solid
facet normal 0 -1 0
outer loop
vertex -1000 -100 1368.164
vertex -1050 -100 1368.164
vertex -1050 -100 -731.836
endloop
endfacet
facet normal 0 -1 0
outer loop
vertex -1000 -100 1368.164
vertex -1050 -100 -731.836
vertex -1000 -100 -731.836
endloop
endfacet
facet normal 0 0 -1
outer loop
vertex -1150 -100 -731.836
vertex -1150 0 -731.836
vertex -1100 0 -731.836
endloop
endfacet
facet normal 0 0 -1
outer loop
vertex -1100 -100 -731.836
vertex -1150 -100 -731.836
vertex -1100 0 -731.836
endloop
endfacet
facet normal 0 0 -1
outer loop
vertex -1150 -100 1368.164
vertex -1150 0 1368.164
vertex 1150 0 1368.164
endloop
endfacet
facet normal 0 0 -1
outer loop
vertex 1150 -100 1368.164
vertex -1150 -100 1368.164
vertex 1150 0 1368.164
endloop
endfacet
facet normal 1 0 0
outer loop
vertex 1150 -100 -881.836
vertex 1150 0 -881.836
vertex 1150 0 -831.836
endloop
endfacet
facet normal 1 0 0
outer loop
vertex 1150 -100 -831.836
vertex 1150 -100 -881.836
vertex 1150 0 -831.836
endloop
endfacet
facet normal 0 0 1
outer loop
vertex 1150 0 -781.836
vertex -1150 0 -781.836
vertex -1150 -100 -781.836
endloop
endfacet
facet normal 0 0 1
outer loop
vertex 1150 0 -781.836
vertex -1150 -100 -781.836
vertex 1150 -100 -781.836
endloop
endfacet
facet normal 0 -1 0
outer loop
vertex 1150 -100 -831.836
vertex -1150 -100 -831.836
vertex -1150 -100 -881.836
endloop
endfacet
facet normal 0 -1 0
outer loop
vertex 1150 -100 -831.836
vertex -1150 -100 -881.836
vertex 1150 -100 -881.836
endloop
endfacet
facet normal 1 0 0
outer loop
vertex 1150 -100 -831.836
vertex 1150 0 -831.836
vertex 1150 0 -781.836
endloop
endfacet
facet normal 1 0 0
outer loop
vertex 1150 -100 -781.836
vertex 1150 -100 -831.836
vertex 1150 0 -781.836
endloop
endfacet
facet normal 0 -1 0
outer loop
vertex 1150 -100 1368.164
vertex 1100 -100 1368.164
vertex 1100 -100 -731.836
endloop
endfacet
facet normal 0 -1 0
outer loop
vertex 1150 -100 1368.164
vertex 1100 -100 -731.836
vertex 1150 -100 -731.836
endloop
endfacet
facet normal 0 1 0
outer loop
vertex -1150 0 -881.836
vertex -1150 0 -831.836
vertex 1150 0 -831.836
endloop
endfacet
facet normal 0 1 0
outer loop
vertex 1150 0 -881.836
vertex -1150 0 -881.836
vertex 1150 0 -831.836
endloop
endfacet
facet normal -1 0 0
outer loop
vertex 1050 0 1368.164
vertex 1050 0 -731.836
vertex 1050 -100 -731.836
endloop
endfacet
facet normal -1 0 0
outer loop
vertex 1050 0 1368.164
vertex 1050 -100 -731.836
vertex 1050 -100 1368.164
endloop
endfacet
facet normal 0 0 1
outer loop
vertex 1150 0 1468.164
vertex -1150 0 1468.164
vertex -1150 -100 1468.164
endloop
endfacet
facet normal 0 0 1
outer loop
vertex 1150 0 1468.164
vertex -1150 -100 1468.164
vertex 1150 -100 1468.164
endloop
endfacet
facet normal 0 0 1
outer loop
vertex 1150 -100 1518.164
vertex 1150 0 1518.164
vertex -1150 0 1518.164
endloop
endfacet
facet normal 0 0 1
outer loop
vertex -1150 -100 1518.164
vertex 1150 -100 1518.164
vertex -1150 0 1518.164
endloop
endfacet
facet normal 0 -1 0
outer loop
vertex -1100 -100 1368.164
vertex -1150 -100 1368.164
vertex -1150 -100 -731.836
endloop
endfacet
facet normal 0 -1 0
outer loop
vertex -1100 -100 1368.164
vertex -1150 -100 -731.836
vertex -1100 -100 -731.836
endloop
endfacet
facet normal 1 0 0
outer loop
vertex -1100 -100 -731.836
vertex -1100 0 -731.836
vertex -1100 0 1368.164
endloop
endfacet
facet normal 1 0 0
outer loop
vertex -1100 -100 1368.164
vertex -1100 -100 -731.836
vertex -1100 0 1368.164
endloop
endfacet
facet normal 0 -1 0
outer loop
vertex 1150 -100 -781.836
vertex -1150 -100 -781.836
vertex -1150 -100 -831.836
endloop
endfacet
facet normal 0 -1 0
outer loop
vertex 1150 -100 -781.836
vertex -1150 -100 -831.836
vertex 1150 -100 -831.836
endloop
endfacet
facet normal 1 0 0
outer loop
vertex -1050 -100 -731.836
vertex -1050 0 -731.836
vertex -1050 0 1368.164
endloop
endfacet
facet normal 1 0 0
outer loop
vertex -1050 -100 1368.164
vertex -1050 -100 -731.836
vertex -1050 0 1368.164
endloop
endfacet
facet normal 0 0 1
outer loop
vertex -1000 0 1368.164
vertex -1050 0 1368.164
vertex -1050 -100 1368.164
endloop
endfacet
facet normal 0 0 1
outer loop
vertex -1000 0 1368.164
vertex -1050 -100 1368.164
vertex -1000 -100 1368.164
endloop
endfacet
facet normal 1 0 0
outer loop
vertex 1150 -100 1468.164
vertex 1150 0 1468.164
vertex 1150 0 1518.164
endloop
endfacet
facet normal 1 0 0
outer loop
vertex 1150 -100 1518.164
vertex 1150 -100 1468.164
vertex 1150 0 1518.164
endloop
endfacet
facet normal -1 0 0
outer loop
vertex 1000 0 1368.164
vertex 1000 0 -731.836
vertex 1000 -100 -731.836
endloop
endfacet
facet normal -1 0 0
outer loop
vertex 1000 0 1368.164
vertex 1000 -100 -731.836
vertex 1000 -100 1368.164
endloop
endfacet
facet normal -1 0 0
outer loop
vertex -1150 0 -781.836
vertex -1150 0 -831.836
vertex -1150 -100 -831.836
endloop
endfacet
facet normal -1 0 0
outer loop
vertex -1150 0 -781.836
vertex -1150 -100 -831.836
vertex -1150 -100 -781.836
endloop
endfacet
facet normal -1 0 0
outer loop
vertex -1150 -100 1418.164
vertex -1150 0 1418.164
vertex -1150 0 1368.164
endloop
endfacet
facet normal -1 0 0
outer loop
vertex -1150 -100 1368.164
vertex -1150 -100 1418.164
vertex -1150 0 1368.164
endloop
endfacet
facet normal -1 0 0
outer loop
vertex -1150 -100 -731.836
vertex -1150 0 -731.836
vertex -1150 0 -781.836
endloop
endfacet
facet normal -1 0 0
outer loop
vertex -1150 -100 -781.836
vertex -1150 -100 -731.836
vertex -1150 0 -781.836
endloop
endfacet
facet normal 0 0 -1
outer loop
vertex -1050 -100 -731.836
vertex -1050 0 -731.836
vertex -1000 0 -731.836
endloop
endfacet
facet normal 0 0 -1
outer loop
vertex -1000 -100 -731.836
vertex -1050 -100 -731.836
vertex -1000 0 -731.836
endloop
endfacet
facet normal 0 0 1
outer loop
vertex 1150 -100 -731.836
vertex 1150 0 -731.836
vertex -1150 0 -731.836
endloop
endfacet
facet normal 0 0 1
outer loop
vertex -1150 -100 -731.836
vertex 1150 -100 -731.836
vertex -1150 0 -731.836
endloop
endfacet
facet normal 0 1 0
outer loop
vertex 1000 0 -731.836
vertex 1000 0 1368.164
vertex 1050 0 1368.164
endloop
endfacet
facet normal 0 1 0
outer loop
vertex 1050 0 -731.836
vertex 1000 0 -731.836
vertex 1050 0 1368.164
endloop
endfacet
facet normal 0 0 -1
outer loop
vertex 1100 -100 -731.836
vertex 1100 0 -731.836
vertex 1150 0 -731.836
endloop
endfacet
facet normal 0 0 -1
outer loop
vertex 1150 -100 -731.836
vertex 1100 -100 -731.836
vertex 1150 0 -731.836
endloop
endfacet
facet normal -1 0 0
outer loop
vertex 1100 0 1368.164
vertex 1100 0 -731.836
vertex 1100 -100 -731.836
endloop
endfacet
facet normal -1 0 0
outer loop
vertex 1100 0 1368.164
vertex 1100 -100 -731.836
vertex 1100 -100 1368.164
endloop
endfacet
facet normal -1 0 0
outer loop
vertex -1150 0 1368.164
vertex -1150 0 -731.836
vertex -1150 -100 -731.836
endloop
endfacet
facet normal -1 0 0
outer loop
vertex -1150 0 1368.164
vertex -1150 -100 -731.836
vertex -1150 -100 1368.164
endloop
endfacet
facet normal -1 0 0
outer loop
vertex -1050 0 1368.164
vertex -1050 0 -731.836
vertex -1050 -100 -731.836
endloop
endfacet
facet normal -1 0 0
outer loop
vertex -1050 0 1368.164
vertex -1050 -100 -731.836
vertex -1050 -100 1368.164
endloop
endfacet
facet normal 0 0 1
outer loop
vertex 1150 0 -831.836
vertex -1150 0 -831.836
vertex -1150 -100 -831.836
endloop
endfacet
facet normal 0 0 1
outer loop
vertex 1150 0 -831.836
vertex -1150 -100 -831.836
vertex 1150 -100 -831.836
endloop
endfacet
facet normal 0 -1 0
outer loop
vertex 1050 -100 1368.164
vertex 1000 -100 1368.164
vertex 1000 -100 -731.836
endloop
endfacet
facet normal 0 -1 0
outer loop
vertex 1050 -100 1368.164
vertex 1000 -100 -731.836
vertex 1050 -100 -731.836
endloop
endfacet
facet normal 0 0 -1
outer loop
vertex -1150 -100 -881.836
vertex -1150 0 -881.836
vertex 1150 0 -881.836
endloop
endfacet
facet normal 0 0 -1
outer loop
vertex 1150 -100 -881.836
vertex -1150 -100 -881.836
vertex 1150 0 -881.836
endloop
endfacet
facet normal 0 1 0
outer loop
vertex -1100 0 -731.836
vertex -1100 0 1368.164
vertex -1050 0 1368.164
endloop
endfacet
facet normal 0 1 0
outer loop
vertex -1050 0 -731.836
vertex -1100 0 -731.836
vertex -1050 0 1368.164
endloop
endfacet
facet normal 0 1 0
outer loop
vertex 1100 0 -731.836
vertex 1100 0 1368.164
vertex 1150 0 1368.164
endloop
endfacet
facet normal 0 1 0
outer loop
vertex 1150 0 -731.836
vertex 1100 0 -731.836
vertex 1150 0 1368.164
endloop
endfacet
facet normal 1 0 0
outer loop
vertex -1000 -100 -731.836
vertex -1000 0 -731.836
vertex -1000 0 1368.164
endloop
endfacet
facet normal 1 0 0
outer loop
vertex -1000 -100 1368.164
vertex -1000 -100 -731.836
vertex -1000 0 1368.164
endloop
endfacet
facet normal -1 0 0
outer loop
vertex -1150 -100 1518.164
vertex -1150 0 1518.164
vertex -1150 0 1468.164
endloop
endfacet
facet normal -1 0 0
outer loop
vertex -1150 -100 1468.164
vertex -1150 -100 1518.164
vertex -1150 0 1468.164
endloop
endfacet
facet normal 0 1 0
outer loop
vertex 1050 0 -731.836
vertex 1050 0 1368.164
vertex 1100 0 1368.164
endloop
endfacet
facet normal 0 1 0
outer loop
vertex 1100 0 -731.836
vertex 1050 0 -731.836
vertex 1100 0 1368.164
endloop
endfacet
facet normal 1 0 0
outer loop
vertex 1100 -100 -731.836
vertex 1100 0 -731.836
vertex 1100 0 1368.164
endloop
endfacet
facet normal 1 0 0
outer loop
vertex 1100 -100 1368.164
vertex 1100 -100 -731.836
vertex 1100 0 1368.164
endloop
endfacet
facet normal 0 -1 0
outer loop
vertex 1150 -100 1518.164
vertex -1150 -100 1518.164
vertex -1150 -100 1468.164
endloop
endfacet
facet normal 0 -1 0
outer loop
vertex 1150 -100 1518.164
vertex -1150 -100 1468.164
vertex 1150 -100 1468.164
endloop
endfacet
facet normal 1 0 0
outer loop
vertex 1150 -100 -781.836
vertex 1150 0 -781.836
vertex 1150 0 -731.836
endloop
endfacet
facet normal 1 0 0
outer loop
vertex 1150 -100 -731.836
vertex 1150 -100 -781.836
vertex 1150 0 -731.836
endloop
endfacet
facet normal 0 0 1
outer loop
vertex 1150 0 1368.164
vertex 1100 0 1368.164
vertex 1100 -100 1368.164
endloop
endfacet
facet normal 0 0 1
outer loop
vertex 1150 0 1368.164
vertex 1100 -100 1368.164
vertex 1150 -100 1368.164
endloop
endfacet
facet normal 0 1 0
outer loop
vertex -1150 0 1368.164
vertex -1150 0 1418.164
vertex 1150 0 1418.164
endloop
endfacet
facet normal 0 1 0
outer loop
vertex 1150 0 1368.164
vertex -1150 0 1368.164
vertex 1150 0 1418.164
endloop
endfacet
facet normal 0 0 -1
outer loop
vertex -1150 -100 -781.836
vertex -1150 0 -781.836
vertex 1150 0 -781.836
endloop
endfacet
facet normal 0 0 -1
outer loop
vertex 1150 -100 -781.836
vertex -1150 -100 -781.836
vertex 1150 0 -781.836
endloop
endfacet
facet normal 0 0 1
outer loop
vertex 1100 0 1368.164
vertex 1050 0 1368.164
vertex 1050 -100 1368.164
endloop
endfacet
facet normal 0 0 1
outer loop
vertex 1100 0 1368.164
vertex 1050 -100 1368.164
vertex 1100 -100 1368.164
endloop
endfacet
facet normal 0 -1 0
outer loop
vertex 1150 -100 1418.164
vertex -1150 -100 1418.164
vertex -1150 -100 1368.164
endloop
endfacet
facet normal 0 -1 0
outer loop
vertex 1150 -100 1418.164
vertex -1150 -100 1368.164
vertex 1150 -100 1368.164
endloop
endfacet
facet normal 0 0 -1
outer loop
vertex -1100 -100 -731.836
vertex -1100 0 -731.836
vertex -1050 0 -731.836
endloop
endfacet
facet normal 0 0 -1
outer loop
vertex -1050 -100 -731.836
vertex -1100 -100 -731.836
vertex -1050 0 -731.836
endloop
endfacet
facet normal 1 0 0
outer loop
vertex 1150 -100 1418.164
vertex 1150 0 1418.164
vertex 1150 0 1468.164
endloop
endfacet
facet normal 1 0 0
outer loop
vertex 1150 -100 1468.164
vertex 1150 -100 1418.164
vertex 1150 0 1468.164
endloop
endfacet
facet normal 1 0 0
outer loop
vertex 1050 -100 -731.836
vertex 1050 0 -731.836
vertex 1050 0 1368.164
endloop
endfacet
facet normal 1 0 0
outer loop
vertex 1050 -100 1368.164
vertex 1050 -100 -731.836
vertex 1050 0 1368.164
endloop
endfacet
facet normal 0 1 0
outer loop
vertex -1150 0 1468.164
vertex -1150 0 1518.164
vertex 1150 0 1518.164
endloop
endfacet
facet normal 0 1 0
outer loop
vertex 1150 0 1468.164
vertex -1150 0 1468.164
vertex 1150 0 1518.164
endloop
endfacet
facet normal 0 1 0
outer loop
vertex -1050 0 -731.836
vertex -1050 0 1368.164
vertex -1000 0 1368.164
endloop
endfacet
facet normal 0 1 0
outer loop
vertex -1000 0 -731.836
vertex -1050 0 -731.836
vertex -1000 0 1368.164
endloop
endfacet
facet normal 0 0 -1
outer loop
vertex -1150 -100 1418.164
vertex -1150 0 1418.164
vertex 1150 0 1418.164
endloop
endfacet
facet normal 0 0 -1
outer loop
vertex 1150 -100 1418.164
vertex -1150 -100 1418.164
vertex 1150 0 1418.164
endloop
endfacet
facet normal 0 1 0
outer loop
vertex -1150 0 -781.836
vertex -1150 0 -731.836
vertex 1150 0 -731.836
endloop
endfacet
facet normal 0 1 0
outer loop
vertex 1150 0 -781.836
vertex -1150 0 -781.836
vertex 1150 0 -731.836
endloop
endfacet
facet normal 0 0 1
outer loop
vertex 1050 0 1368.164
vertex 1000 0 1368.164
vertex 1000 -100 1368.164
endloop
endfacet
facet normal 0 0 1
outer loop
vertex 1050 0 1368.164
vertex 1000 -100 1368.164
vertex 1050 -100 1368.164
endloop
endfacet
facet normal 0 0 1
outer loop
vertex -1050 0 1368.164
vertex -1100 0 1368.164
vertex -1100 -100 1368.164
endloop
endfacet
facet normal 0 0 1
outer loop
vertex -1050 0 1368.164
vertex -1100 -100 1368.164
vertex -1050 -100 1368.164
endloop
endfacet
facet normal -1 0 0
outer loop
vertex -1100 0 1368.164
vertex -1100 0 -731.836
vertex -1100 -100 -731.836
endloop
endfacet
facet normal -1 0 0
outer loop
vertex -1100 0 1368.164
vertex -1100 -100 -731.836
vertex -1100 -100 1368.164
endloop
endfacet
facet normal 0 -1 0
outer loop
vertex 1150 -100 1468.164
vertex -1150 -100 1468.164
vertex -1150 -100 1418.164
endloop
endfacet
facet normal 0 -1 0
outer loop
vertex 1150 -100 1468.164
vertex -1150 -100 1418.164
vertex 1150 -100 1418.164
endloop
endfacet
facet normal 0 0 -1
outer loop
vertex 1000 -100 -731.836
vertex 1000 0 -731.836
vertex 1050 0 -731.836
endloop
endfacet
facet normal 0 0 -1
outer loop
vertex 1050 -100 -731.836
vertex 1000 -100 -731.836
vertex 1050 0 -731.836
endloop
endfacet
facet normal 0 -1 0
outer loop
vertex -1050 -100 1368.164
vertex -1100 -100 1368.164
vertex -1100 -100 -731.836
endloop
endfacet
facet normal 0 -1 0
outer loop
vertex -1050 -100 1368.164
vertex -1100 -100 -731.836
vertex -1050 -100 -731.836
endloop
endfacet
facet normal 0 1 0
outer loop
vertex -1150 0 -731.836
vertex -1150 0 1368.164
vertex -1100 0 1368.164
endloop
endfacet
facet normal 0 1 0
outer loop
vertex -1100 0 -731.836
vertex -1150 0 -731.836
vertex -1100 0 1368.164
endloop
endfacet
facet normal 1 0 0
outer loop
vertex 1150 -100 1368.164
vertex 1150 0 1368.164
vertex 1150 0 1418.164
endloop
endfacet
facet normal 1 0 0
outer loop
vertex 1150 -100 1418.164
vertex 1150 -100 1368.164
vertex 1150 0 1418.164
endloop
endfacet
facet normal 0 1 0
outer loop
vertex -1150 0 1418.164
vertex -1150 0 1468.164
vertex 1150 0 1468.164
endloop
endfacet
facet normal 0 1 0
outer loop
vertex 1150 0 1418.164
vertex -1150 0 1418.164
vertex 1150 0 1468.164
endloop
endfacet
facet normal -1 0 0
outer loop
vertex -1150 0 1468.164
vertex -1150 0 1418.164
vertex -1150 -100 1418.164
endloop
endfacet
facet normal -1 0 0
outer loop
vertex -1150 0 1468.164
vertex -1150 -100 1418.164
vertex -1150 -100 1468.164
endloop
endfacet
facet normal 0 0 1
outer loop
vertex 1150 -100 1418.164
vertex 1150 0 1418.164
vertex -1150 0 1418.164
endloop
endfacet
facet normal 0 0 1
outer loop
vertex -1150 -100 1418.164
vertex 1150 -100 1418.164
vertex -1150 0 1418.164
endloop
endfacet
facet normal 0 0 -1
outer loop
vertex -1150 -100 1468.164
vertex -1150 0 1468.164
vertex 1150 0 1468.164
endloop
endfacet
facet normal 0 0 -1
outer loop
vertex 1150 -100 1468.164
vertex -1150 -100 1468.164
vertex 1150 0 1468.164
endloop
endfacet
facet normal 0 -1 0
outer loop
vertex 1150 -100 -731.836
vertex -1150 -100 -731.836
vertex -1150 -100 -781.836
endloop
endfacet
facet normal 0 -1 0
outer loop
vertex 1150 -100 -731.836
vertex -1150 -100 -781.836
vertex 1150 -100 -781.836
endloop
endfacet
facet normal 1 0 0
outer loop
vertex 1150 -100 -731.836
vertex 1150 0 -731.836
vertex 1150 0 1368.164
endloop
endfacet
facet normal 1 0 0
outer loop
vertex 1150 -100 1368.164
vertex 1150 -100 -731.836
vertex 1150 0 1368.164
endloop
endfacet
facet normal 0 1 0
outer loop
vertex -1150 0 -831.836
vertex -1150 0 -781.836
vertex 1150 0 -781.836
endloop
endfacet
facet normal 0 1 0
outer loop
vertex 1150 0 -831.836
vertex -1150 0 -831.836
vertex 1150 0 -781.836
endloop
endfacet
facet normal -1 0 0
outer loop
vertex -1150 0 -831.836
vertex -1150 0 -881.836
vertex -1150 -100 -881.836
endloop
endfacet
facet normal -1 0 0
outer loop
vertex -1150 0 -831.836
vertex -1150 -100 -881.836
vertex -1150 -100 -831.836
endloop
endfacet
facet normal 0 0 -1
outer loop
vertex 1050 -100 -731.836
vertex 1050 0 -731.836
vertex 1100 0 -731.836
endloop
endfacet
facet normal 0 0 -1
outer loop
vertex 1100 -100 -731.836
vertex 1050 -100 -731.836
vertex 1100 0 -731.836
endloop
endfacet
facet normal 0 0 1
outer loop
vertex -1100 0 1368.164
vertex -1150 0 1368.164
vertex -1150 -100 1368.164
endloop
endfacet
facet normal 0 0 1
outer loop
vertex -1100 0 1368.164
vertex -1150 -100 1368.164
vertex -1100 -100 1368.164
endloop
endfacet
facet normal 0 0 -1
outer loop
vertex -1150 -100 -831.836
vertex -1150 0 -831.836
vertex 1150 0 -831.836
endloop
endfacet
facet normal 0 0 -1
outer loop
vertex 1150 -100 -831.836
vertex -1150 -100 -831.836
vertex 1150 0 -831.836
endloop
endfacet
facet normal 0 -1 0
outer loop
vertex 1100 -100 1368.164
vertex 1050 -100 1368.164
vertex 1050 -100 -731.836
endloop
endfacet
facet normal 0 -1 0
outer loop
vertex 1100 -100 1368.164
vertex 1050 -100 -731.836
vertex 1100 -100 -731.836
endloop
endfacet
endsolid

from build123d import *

# Parameters (mm, degrees)
F0_W     = 2300
F0_H     = 50
F0_W_2   = 50
F0_H_2   = 2100
F1_DEPTH = 100
F2_DEPTH = 100
F3_DEPTH = 100


with BuildPart() as f1:
    # F0 (on Front) → F1 (new body)
    with BuildSketch(Plane.XZ):
        with Locations((0, 1443.164492)):
            Rectangle(F0_W, F0_H)
        with Locations((-1125, 318.164492)):
            Rectangle(F0_W_2, F0_H_2)
        with Locations((-1025, 318.164492)):
            Rectangle(F0_W_2, F0_H_2)
        with Locations((0, -806.835508)):
            Rectangle(F0_W, F0_H)
        with Locations((1125, 318.164492)):
            Rectangle(F0_W_2, F0_H_2)
        with Locations((1025, 318.164492)):
            Rectangle(F0_W_2, F0_H_2)
    extrude(amount=F1_DEPTH)


with BuildPart() as f2:
    # F0 (on Front) → F2 (new body)
    with BuildSketch(Plane.XZ):
        Polygon((-1150, 1518.164492), (-1150, 1468.164492), (1150, 1468.164492), (1150, 1518.164492), (0, 1518.164492), (-1023.93508, 1518.164492), (-1079.289322, 1518.164492), align=None)
        Polygon((-1150, 1418.164492), (-1150, 1368.164492), (-1100, 1368.164492), (-1050, 1368.164492), (-1000, 1368.164492), (-950, 1368.164492), (-900, 1368.164492), (900, 1368.164492), (950, 1368.164492), (1000, 1368.164492), (1050, 1368.164492), (1100, 1368.164492), (1150, 1368.164492), (1150, 1418.164492), align=None)
        Polygon((-1150, -731.835508), (-1150, -781.835508), (1150, -781.835508), (1150, -731.835508), (1100, -731.835508), (1050, -731.835508), (1000, -731.835508), (950, -731.835508), (900, -731.835508), (-900, -731.835508), (-950, -731.835508), (-1000, -731.835508), (-1050, -731.835508), (-1100, -731.835508), align=None)
        with Locations((0, -856.835508)):
            Rectangle(F0_W, F0_H)
    extrude(amount=F2_DEPTH)


with BuildPart() as f3:
    # F0 (on Front) → F3 (new body)
    with BuildSketch(Plane.XZ):
        with Locations((-1075, 318.164492)):
            Rectangle(F0_W_2, F0_H_2)
        with Locations((1075, 318.164492)):
            Rectangle(F0_W_2, F0_H_2)
    extrude(amount=F3_DEPTH)


solid = Compound([f1.part, f2.part, f3.part])
